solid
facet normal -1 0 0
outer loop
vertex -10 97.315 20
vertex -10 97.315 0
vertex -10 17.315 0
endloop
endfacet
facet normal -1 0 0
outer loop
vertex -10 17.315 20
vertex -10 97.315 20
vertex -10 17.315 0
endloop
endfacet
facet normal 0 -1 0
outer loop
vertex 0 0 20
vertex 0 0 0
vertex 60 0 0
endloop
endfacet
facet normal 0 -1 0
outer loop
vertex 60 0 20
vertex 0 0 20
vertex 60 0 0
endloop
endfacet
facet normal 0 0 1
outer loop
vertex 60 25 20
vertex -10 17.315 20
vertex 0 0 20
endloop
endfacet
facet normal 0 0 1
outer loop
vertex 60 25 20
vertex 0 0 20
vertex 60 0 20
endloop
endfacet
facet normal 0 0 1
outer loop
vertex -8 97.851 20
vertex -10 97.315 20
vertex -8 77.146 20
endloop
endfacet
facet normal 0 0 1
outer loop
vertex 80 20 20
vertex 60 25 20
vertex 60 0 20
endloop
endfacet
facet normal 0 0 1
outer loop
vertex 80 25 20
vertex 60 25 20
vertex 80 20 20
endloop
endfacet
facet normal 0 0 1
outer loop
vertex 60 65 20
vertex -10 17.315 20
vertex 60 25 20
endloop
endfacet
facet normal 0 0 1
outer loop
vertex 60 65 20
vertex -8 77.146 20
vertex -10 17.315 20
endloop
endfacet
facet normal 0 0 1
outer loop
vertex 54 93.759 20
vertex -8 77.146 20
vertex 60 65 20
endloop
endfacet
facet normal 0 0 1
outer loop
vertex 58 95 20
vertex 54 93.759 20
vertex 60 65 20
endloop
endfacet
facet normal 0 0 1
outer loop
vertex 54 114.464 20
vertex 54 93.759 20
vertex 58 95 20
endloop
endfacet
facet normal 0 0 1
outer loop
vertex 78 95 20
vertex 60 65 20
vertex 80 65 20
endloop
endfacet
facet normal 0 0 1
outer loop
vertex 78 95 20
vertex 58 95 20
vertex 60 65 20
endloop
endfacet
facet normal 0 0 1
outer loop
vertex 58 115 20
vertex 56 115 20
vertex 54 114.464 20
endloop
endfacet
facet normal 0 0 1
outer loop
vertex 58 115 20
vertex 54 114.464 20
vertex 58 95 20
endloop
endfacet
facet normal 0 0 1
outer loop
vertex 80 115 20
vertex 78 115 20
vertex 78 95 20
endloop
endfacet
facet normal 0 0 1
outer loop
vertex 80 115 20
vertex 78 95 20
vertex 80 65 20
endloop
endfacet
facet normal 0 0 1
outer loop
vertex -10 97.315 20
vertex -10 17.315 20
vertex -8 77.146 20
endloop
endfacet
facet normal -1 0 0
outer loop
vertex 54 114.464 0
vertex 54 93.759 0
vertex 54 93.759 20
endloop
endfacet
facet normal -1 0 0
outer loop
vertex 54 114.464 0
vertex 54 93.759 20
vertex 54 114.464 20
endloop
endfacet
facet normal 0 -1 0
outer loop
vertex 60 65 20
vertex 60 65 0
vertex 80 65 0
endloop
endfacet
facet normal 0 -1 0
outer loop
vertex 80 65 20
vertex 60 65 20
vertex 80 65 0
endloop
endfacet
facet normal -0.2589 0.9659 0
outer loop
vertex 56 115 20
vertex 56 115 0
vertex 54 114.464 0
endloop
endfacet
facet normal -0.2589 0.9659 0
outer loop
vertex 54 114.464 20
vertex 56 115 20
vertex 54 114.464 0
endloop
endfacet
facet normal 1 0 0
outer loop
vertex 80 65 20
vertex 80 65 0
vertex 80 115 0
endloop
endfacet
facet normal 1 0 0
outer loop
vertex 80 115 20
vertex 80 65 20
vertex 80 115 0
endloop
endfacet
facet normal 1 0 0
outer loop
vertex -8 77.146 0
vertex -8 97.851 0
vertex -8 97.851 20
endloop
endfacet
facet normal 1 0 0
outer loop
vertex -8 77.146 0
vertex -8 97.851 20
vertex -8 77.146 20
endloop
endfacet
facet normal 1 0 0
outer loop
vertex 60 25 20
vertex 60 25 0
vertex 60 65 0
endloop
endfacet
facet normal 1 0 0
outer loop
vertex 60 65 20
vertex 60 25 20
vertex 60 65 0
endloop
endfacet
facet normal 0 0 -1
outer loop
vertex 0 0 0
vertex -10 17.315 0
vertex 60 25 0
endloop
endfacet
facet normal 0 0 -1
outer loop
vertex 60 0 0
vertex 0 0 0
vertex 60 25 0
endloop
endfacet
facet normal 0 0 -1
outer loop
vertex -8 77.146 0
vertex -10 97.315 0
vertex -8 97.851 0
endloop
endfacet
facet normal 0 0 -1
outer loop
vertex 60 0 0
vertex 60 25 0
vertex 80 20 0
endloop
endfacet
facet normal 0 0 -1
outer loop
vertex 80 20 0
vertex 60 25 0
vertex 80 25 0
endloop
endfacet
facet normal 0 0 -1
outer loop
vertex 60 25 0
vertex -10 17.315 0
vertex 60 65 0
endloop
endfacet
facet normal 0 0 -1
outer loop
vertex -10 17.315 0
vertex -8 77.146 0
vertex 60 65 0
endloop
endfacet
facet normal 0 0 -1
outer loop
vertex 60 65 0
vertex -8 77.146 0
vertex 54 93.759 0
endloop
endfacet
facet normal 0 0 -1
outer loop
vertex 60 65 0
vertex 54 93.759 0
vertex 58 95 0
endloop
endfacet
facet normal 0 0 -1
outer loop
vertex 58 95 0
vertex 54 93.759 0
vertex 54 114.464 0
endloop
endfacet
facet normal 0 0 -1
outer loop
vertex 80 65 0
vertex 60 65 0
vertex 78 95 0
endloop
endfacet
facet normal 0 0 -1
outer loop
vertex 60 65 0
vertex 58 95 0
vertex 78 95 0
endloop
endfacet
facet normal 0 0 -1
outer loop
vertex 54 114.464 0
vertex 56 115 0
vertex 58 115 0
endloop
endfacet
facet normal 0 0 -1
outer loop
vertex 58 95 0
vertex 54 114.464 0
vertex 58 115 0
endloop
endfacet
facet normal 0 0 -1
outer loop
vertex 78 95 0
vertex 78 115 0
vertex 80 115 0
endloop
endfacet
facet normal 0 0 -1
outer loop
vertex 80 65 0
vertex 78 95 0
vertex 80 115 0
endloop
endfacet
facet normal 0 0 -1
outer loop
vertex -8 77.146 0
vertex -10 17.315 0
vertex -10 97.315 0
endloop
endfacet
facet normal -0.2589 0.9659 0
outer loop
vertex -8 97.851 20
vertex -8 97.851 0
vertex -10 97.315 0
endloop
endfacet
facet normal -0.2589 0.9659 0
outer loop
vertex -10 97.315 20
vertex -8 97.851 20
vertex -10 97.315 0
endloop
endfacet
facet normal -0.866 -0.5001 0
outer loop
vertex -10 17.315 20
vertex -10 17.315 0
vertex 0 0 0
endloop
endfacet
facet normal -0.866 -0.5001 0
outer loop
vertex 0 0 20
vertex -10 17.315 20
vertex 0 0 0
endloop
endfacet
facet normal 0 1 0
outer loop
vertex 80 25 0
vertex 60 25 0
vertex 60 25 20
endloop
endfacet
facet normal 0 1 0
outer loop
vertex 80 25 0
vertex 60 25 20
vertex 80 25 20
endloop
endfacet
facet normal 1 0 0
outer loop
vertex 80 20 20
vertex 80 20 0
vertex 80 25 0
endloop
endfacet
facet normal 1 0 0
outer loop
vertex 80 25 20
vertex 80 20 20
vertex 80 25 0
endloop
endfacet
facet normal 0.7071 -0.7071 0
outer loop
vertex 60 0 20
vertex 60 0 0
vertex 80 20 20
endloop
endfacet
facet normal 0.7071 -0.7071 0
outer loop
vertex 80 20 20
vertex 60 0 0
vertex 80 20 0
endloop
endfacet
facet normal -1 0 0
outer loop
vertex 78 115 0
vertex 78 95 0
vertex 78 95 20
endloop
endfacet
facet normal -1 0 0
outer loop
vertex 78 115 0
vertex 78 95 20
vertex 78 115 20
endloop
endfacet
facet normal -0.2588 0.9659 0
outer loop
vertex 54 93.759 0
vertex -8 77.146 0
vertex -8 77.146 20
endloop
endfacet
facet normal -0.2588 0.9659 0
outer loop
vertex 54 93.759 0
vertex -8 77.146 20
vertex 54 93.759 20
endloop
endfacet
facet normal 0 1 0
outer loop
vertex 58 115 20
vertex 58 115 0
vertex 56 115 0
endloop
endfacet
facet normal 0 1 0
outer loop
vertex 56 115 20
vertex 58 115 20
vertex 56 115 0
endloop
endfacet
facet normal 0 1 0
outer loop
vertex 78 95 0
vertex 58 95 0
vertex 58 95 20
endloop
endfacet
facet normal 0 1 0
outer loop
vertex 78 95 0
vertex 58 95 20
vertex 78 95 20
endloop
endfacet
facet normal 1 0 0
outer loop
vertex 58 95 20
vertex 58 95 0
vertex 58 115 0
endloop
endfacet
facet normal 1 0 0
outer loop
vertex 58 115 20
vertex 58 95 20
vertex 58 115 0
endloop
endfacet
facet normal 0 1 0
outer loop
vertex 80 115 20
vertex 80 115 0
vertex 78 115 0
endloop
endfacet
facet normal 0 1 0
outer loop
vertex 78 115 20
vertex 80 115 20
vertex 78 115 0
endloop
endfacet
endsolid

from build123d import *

# Parameters (mm, degrees)
BOSS_EXTRUDE1_DEPTH     = 20
CUT_EXTRUDE1_DEPTH      = 142.509716981
CUT_EXTRUDE1_DEPTH_BACK = 20
SKETCH2_W               = 20
SKETCH2_H               = 20
SKETCH2_H_2             = 40


with BuildPart() as part:
    # Sketch1 → Boss-Extrude1 (new body)
    with BuildSketch(Plane.XY):
        Polygon((0, 0), (60, 0), (80, 20), (80, 115), (56, 115), (-10, 97.3153533), (-10, 17.3153533), align=None)
    extrude(amount=BOSS_EXTRUDE1_DEPTH)

    # Sketch2 → Cut-Extrude1 (cut, two sides: drawn at the far end of the back side and taken through both)
    with BuildSketch(Plane.XY.offset(20).offset(-CUT_EXTRUDE1_DEPTH_BACK)):
        with Locations((68, 105)):
            Rectangle(SKETCH2_W, SKETCH2_H)
        Polygon((54, 93.758578007), (54, 114.464101615), (-8, 97.851251684), (-8, 77.145728076), align=None)
        with Locations((70, 45)):
            Rectangle(SKETCH2_W, SKETCH2_H_2)
    extrude(amount=CUT_EXTRUDE1_DEPTH + CUT_EXTRUDE1_DEPTH_BACK, mode=Mode.SUBTRACT)


solid = part.part
